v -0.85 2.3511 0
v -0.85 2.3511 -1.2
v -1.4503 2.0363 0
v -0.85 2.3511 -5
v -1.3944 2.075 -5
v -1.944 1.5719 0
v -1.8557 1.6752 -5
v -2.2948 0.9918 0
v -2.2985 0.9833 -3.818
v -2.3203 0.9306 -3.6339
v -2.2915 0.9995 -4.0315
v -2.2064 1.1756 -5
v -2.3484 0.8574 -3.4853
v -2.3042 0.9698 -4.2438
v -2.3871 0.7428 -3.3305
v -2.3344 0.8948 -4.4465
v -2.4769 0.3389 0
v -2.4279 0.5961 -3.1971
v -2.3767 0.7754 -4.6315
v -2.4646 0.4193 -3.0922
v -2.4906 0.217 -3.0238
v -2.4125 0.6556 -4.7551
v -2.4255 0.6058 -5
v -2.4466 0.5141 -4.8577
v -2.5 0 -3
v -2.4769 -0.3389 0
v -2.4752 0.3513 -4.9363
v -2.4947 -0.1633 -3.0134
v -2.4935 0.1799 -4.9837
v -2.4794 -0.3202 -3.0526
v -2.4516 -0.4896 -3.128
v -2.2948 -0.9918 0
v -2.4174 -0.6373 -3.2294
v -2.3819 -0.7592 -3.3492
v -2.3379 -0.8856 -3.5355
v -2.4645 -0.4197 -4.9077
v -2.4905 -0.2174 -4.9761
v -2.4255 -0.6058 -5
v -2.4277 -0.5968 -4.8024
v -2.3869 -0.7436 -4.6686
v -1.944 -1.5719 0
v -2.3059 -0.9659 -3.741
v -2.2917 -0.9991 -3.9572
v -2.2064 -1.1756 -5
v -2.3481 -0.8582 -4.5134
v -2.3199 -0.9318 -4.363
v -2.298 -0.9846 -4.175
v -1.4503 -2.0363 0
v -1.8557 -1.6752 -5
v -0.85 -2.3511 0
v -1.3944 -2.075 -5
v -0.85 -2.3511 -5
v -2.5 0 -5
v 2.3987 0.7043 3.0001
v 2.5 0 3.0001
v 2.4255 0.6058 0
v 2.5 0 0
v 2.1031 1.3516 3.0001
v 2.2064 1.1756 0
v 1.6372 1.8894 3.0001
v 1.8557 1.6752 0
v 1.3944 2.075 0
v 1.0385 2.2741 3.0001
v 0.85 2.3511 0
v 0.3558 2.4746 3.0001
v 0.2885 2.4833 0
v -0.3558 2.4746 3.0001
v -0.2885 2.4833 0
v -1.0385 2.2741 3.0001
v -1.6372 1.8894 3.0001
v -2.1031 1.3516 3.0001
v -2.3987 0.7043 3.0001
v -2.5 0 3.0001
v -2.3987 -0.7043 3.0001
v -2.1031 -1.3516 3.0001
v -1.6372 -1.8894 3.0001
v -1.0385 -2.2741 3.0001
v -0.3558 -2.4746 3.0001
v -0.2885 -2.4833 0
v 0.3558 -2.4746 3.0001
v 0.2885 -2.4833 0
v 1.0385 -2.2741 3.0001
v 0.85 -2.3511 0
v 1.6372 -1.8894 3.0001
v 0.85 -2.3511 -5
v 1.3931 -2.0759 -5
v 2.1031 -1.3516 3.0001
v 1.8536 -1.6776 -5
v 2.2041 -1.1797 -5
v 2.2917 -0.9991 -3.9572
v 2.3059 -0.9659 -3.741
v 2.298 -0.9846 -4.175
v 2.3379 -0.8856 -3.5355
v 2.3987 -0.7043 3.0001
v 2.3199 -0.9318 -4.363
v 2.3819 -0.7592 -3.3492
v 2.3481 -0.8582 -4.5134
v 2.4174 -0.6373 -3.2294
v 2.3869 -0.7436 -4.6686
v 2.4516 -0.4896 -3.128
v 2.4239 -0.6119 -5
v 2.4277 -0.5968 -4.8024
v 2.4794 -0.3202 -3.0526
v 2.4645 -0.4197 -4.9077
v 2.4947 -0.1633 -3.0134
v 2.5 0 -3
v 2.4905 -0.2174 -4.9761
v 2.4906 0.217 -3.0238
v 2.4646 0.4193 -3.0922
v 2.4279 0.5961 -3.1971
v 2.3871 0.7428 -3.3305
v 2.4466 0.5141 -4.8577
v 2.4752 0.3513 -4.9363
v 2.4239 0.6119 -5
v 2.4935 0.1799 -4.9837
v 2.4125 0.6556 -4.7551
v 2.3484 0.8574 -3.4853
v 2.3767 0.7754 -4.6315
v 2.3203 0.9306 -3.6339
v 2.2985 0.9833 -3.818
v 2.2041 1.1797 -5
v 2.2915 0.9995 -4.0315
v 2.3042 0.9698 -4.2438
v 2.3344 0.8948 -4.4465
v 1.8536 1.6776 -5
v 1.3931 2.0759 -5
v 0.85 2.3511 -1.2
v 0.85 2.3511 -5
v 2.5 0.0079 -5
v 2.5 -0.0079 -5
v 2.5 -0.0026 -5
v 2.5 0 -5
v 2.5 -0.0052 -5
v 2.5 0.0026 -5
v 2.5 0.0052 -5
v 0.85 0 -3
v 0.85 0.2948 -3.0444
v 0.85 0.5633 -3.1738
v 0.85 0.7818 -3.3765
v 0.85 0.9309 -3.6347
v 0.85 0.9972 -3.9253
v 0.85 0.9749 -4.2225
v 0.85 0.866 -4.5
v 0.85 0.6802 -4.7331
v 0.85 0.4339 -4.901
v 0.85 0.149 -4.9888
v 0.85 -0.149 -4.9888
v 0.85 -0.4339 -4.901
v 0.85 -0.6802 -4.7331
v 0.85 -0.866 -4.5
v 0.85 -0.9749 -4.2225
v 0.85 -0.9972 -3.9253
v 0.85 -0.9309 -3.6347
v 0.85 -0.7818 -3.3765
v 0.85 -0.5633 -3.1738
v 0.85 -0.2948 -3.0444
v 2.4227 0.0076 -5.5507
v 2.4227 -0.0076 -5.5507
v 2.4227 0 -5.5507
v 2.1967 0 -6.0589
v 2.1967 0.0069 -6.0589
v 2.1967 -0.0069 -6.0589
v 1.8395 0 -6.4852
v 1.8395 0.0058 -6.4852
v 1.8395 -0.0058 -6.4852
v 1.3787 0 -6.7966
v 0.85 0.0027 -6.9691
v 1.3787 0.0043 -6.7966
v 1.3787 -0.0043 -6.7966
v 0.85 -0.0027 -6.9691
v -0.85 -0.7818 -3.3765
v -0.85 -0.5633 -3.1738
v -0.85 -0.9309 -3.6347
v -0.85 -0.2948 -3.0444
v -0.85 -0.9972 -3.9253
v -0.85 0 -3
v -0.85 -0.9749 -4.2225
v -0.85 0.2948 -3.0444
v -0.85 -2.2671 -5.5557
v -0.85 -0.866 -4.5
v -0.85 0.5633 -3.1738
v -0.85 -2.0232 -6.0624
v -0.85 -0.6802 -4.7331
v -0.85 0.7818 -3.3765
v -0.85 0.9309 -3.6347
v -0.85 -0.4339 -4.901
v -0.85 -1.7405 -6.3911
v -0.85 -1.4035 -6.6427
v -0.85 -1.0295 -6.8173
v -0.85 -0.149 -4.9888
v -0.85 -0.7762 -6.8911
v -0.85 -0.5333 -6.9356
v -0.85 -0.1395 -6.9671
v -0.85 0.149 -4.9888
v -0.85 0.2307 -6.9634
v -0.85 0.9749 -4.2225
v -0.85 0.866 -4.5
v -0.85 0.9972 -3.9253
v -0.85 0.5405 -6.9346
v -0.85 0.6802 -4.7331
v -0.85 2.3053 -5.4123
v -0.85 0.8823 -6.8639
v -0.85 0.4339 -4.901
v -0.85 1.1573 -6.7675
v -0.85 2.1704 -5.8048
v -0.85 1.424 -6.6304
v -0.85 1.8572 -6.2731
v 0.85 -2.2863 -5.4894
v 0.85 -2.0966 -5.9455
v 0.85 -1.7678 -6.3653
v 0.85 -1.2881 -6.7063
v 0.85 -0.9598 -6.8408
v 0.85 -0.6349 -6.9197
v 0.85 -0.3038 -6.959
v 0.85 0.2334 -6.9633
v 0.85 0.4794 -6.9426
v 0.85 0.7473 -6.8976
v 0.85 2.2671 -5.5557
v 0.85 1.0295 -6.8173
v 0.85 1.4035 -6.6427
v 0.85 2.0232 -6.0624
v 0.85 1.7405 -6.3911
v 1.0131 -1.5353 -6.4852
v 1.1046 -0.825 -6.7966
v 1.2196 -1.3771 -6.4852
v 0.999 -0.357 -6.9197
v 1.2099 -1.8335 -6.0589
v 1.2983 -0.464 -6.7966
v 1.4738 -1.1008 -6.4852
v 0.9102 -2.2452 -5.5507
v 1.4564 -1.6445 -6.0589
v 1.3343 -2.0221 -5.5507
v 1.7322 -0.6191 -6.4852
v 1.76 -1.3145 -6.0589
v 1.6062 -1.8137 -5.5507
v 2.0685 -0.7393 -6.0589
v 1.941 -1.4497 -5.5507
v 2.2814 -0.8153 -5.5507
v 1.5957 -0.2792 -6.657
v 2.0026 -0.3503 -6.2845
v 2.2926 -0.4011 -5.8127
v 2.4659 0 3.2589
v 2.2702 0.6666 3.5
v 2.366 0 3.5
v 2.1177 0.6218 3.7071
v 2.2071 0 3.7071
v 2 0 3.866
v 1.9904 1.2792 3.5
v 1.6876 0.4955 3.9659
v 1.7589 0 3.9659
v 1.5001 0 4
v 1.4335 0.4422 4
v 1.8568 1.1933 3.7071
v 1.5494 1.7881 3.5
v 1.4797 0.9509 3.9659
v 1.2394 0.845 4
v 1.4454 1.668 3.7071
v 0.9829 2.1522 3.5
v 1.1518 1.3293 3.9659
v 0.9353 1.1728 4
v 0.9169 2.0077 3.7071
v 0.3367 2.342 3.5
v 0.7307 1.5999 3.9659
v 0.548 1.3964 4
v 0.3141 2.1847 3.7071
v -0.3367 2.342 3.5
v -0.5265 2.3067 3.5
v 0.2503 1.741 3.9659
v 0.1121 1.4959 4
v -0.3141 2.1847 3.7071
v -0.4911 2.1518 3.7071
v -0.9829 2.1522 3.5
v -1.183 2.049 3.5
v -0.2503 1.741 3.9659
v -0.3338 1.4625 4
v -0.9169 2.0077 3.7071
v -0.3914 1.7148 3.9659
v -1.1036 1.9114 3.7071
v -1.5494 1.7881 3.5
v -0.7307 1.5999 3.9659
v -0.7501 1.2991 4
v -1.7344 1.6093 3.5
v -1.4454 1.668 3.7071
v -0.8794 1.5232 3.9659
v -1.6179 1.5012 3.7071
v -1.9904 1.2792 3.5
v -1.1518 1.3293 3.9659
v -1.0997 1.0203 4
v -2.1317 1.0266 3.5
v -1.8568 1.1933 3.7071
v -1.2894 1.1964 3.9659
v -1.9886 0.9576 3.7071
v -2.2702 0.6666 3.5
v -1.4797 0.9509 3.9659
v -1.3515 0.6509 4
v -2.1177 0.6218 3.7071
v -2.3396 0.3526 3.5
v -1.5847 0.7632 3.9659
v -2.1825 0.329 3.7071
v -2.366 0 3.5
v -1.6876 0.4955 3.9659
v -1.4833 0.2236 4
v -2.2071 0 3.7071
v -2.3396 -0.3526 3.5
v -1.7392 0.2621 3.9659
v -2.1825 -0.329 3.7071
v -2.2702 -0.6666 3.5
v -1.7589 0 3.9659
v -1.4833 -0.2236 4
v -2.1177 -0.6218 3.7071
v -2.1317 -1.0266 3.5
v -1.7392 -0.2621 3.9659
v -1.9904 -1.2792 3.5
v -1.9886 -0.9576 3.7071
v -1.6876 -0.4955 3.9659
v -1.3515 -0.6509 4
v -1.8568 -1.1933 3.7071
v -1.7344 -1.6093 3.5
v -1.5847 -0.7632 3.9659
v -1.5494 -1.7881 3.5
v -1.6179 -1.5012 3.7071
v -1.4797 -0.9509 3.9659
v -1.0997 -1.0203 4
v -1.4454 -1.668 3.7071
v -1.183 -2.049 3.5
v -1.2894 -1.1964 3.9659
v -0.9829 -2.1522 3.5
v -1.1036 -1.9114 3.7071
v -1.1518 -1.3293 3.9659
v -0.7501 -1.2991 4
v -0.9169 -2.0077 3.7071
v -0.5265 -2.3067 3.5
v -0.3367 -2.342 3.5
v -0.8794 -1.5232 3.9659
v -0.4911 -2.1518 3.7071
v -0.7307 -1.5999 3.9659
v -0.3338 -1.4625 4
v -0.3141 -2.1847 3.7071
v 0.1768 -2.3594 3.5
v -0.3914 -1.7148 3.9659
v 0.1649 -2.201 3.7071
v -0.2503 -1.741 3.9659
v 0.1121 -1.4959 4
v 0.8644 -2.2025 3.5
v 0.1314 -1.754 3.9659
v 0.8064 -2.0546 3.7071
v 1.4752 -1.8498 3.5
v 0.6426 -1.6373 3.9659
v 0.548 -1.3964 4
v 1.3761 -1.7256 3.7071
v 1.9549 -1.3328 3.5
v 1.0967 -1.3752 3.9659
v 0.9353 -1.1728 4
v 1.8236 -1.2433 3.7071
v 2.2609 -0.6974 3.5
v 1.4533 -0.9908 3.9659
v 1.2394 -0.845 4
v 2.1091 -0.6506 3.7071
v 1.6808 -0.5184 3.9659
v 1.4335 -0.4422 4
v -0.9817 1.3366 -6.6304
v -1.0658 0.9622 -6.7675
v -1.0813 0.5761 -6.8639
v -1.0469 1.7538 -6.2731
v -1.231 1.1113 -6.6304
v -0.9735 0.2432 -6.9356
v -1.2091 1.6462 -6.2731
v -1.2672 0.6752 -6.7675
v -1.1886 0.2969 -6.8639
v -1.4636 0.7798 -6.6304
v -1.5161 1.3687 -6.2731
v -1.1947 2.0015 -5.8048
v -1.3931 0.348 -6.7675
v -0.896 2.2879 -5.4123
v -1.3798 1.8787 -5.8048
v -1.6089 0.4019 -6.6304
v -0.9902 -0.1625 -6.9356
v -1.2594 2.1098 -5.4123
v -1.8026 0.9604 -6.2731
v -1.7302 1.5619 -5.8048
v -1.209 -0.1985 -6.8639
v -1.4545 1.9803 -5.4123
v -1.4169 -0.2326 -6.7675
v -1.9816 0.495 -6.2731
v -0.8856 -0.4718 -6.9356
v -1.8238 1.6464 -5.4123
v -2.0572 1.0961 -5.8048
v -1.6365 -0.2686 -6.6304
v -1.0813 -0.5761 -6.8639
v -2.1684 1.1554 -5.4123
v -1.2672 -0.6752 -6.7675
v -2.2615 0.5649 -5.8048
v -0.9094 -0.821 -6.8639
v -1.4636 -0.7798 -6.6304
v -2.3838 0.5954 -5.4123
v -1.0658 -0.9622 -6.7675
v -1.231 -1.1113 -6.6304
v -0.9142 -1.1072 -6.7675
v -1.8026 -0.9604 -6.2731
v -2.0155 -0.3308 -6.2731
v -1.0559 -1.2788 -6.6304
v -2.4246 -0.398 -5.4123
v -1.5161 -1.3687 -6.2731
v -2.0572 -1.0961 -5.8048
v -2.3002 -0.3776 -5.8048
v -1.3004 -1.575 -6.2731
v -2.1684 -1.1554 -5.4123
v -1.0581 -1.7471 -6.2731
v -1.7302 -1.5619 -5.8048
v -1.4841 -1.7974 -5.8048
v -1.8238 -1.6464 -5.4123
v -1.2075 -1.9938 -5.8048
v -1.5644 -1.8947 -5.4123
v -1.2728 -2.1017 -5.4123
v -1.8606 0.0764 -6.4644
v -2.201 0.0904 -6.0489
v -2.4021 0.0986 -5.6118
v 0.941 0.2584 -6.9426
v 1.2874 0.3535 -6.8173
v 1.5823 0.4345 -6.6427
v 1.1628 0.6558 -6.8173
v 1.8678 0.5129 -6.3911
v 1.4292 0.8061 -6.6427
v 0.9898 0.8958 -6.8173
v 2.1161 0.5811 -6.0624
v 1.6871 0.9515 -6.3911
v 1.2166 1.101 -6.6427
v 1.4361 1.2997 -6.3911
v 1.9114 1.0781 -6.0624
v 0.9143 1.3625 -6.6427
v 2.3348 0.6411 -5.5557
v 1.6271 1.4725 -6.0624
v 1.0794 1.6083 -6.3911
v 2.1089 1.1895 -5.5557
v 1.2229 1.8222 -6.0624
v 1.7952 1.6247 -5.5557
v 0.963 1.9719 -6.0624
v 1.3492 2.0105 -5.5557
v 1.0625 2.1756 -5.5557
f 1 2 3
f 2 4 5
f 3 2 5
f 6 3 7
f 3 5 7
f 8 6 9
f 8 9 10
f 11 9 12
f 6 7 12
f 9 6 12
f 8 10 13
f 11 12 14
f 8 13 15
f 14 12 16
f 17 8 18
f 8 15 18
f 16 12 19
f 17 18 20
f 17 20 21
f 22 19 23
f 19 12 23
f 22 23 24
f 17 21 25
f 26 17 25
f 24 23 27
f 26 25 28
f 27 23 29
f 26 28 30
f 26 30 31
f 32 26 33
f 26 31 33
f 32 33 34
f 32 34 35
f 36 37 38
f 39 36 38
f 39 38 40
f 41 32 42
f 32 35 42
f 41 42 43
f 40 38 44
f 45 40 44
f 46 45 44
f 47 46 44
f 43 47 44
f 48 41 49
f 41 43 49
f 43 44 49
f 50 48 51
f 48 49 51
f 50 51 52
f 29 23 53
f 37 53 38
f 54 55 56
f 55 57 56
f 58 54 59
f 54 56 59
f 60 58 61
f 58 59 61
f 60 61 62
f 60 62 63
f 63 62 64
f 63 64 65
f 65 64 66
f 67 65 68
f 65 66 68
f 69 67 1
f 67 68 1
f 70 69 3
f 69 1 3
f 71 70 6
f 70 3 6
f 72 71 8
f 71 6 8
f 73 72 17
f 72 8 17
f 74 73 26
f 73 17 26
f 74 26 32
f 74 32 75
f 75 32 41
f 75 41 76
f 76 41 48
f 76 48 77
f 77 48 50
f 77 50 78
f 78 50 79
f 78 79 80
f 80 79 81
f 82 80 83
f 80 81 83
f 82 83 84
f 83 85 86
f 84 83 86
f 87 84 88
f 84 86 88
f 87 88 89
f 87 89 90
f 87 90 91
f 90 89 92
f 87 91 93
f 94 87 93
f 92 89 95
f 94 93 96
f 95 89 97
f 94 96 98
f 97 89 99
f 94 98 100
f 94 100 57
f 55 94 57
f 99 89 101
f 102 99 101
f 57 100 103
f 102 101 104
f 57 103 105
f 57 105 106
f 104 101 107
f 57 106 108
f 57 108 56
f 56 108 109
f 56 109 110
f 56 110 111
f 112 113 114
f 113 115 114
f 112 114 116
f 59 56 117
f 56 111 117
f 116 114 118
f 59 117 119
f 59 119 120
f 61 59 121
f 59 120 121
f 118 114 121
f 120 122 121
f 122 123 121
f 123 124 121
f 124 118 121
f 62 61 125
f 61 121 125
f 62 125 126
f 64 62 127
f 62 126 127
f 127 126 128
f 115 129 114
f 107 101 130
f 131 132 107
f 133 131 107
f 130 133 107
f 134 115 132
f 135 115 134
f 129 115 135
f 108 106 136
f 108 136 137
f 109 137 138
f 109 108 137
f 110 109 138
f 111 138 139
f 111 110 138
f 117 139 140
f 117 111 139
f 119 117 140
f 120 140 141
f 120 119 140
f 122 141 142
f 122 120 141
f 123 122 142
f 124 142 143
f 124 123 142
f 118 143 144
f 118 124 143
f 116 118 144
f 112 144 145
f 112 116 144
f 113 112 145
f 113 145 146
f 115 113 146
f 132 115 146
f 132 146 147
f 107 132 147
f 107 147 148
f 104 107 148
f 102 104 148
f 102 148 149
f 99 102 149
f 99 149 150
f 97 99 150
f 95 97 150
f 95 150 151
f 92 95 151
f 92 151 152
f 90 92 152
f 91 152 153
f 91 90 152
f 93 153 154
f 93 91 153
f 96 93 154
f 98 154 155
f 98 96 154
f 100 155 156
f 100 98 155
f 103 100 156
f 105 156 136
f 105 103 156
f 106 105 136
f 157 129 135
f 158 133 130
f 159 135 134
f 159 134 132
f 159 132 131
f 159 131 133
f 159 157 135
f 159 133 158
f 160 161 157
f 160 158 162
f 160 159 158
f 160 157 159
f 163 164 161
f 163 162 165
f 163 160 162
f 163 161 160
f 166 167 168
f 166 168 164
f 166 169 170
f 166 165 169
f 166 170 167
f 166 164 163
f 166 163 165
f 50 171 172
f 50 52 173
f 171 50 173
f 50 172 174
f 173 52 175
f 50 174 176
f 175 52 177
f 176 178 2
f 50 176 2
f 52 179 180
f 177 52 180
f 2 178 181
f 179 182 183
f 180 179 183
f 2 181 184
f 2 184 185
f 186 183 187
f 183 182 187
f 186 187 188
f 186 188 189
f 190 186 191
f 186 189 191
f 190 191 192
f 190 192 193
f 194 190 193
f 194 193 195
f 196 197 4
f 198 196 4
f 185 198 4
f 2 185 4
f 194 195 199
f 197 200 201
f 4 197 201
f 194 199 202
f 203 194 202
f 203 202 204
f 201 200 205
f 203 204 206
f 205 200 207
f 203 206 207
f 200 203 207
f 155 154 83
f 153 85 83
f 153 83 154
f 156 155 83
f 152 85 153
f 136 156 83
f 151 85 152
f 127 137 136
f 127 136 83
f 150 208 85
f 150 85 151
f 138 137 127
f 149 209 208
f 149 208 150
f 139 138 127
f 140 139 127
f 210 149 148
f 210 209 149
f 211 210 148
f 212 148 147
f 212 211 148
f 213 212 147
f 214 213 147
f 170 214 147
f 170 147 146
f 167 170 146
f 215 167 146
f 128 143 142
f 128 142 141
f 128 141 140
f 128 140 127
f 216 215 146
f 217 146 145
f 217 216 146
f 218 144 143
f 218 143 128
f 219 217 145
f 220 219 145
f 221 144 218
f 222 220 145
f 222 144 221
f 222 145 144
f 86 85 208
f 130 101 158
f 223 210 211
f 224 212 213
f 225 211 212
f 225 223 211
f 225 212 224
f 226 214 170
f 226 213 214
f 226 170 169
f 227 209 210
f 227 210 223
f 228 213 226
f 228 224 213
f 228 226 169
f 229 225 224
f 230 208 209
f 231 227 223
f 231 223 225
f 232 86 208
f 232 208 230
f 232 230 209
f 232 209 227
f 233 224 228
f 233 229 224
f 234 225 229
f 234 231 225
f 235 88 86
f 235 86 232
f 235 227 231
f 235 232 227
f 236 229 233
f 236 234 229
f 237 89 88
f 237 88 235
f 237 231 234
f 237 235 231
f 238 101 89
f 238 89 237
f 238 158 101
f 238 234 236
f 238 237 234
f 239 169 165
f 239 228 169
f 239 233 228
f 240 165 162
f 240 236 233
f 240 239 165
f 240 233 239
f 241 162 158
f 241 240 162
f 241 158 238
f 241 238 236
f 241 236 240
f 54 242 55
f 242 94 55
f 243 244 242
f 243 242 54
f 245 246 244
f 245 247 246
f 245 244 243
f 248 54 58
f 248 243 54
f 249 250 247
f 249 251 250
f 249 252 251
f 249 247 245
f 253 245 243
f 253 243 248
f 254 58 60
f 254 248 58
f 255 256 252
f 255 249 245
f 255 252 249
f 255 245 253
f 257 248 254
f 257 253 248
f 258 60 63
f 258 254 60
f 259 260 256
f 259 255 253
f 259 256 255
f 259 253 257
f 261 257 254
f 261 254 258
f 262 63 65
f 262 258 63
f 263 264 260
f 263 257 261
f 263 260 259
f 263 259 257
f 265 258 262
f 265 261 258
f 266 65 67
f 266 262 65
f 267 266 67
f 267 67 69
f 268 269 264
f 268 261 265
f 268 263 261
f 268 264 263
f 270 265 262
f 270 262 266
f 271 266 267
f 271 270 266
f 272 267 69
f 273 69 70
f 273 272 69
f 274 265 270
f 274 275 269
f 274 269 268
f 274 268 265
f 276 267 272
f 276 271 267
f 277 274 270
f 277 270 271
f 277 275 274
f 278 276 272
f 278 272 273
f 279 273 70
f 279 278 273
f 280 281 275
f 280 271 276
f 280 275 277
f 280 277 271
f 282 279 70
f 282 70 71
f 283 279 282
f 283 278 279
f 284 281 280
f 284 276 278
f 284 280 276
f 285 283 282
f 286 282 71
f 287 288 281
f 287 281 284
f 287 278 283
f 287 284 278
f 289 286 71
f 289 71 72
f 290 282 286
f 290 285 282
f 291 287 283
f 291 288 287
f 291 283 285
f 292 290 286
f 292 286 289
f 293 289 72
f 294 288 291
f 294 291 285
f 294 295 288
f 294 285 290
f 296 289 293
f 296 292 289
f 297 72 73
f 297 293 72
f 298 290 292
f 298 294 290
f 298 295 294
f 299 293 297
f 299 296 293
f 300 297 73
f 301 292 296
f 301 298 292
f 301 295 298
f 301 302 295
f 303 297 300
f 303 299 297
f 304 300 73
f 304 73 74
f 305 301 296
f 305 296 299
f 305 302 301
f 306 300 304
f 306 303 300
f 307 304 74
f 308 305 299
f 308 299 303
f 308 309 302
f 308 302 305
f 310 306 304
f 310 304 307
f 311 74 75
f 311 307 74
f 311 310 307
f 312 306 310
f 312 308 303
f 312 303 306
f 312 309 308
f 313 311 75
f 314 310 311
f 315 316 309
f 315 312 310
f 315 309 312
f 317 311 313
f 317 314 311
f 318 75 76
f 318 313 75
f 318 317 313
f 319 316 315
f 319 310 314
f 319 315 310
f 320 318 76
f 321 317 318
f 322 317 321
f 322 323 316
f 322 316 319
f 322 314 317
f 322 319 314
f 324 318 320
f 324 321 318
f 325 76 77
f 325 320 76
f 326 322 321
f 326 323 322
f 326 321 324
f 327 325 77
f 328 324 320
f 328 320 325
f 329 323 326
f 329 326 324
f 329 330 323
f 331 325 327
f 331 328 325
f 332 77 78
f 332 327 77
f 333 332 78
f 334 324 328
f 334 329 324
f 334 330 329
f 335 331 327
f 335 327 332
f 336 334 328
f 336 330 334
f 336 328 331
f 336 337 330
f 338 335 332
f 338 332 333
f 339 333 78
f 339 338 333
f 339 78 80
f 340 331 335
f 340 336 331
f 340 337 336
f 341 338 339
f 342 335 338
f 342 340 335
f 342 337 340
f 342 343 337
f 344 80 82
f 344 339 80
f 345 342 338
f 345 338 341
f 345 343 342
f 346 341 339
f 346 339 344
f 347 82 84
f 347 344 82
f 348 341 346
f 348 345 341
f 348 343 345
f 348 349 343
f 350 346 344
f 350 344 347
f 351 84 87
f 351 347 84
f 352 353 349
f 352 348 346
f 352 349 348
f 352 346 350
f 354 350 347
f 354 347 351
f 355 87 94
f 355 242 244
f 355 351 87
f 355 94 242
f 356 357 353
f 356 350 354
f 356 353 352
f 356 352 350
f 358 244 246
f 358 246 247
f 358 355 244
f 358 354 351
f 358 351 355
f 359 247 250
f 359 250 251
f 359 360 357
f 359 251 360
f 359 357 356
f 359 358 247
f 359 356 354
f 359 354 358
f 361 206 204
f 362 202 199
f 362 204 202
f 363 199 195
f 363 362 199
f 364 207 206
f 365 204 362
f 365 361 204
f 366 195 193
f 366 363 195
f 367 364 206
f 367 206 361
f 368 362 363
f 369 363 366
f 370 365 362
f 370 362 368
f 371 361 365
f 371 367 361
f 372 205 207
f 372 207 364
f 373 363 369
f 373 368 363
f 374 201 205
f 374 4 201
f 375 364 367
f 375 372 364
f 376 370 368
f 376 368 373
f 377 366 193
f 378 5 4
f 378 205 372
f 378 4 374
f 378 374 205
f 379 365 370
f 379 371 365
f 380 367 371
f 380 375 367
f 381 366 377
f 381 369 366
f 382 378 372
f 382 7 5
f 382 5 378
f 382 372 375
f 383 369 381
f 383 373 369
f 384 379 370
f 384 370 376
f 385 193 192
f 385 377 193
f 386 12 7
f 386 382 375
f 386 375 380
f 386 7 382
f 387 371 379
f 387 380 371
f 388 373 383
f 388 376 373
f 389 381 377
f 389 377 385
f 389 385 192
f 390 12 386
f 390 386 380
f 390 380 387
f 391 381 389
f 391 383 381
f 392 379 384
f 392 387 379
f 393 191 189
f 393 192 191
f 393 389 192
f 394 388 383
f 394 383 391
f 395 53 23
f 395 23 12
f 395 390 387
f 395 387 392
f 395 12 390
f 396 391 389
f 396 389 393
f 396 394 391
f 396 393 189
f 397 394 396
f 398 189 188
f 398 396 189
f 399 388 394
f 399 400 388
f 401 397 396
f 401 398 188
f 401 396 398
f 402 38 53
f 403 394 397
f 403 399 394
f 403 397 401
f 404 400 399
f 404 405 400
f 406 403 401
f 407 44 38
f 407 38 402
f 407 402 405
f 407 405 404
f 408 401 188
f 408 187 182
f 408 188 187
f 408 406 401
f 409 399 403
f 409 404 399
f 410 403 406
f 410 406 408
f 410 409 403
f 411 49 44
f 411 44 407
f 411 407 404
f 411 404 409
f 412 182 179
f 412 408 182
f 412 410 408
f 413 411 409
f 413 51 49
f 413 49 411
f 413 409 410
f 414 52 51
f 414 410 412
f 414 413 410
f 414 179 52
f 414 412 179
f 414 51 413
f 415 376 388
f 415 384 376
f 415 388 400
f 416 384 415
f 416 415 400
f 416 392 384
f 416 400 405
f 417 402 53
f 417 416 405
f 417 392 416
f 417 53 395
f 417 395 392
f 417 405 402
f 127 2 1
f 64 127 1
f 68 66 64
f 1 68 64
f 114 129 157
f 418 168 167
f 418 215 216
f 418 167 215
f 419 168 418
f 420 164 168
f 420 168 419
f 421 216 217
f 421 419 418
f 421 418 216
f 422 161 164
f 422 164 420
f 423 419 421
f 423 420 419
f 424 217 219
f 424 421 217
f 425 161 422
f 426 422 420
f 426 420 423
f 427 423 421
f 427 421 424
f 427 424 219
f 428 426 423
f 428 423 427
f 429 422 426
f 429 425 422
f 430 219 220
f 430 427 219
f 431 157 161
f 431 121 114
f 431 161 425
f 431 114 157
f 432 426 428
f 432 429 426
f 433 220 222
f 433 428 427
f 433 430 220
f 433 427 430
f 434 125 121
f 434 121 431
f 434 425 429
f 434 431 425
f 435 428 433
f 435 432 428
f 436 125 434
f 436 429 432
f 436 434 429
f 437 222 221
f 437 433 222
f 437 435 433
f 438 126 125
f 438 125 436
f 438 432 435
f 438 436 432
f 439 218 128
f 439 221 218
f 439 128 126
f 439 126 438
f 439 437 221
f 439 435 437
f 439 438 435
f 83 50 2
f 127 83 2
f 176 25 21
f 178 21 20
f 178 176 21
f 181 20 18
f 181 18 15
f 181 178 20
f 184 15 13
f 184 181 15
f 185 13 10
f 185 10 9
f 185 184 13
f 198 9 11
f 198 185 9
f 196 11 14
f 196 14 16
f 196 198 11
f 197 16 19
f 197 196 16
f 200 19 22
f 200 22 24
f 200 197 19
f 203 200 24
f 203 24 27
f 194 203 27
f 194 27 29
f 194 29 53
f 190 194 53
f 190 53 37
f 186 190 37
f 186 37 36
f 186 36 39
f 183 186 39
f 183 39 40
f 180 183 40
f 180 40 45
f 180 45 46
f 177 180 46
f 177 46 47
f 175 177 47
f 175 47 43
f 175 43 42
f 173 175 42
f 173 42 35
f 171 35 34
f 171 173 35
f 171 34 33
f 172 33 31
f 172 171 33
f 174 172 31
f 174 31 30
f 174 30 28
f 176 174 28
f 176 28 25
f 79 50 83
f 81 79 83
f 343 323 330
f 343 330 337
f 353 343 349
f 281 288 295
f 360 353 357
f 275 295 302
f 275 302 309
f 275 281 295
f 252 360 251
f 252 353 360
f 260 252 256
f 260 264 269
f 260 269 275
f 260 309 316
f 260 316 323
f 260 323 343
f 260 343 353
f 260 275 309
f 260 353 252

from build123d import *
from build123d.topology import SkipClean

# Parameters (mm, degrees)
ESQUISSE1_R                  = 2.5
BOSS_EXTRU_1_DEPTH           = 4
BOSS_EXTRU_2_START           = 7
BOSS_EXTRU_2_DEPTH           = 7
ENL_V_MAT_EXTRU_2_DEPTH      = 9.153066908
ENL_V_MAT_EXTRU_2_DEPTH_BACK = 9.153066908
ESQUISSE3_R                  = 1
CONG_1_R                     = 2
BOSS_EXTRU_3_REACH           = 10.127
CONG_2_R                     = 1


# Some blends are built 0.0001 mm under size
with BuildPart() as part:
    # Esquisse1 → Boss.-Extru.1 (new body)
    with BuildSketch(Plane.XY):
        Circle(ESQUISSE1_R)
    extrude(amount=BOSS_EXTRU_1_DEPTH)

    # Esquisse2 → Boss.-Extru.2 (add)
    with SkipClean():  # the faces are left unmerged after this step: merging them gives an invalid solid
        with BuildSketch(Plane(origin=(0, 0, 0), x_dir=(-1, 0, 0), z_dir=(0, 0, -1)).offset(BOSS_EXTRU_2_START)):
            with BuildLine():
                Line((0.85, -2.351063589), (0.85, 2.351063589))
                ThreePointArc((0.85, 2.351063589), (2.5, 0), (0.85, -2.351063589))
            make_face()
            with BuildLine():
                Line((-0.85, -2.351063589), (-0.85, 2.351063589))
                ThreePointArc((-0.85, 2.351063589), (-2.5, 0), (-0.85, -2.351063589))
            make_face()
        extrude(amount=-BOSS_EXTRU_2_DEPTH)

    # Esquisse3 → Enlèv. mat.-Extru.2 (cut, two sides: drawn at the far end of the back side and taken through both)
    with SkipClean():  # the faces are left unmerged after this step: merging them gives an invalid solid
        with BuildSketch(Plane.ZY.offset(-0.85).offset(-ENL_V_MAT_EXTRU_2_DEPTH_BACK)):
            with Locations((-4, 0)):
                Circle(ESQUISSE3_R)
        extrude(amount=ENL_V_MAT_EXTRU_2_DEPTH + ENL_V_MAT_EXTRU_2_DEPTH_BACK, mode=Mode.SUBTRACT)

    # Congé1
    # the kernel refuses this fillet: 2 mm, written as the material it takes off along each edge
    with BuildSketch(Plane(origin=(0, 0, -7), x_dir=(0.9999950652018581, 0.003141587485879649, 0), z_dir=(0.003141587485879649, -0.9999950652018581, 0))) as cong_1_piece_1:
        with BuildLine():
            CenterArc((2.5 - CONG_1_R, CONG_1_R), CONG_1_R, 270, 90)
            Line((2.5 - CONG_1_R, 0), (2.5, 0))
            Line((2.5, 0), (2.5, CONG_1_R))
        make_face()
    revolve(axis=Axis((0, 0, -7), (0, 0, 1)), revolution_arc=359.64, mode=Mode.SUBTRACT)
    with BuildSketch(Plane(origin=(0, 0, -7), x_dir=(-0.9999950652018581, 0.003141587485879604, 0), z_dir=(-0.003141587485879604, -0.9999950652018581, 0))) as cong_1_piece_2:
        with BuildLine():
            CenterArc((2.5 - CONG_1_R, -CONG_1_R), CONG_1_R, 0, 90)
            Line((2.5 - CONG_1_R, 0), (2.5, 0))
            Line((2.5, 0), (2.5, -CONG_1_R))
        make_face()
    revolve(axis=Axis((0, 0, -7), (0, 0, -1)), revolution_arc=359.64, mode=Mode.SUBTRACT)

    # Esquisse4 → Boss.-Extru.3 (add, up to next)
    with BuildSketch(Plane(origin=(-0.85, 0, 0), x_dir=(0, 0, -1), z_dir=(1, 0, 0)), mode=Mode.PRIVATE) as boss_extru_3_sk1:
        Polygon((0, -2.351063589), (1.2, 2.351063589), (0, 2.351063589), align=None)
    boss_extru_3_tool1 = extrude(boss_extru_3_sk1.sketch, amount=BOSS_EXTRU_3_REACH, mode=Mode.PRIVATE) - part.part
    add(boss_extru_3_tool1.solids().sort_by_distance((-0.85, 0.783688, -0.4))[0])

    # Congé2
    cong_2_edges = [part.edges().sort_by_distance(p)[0] for p in [
        (-2.5, 0, 4),
    ]]
    fillet(cong_2_edges, radius=CONG_2_R - 0.0001)  # a hair under: the kernel refuses the full size


solid = part.part
